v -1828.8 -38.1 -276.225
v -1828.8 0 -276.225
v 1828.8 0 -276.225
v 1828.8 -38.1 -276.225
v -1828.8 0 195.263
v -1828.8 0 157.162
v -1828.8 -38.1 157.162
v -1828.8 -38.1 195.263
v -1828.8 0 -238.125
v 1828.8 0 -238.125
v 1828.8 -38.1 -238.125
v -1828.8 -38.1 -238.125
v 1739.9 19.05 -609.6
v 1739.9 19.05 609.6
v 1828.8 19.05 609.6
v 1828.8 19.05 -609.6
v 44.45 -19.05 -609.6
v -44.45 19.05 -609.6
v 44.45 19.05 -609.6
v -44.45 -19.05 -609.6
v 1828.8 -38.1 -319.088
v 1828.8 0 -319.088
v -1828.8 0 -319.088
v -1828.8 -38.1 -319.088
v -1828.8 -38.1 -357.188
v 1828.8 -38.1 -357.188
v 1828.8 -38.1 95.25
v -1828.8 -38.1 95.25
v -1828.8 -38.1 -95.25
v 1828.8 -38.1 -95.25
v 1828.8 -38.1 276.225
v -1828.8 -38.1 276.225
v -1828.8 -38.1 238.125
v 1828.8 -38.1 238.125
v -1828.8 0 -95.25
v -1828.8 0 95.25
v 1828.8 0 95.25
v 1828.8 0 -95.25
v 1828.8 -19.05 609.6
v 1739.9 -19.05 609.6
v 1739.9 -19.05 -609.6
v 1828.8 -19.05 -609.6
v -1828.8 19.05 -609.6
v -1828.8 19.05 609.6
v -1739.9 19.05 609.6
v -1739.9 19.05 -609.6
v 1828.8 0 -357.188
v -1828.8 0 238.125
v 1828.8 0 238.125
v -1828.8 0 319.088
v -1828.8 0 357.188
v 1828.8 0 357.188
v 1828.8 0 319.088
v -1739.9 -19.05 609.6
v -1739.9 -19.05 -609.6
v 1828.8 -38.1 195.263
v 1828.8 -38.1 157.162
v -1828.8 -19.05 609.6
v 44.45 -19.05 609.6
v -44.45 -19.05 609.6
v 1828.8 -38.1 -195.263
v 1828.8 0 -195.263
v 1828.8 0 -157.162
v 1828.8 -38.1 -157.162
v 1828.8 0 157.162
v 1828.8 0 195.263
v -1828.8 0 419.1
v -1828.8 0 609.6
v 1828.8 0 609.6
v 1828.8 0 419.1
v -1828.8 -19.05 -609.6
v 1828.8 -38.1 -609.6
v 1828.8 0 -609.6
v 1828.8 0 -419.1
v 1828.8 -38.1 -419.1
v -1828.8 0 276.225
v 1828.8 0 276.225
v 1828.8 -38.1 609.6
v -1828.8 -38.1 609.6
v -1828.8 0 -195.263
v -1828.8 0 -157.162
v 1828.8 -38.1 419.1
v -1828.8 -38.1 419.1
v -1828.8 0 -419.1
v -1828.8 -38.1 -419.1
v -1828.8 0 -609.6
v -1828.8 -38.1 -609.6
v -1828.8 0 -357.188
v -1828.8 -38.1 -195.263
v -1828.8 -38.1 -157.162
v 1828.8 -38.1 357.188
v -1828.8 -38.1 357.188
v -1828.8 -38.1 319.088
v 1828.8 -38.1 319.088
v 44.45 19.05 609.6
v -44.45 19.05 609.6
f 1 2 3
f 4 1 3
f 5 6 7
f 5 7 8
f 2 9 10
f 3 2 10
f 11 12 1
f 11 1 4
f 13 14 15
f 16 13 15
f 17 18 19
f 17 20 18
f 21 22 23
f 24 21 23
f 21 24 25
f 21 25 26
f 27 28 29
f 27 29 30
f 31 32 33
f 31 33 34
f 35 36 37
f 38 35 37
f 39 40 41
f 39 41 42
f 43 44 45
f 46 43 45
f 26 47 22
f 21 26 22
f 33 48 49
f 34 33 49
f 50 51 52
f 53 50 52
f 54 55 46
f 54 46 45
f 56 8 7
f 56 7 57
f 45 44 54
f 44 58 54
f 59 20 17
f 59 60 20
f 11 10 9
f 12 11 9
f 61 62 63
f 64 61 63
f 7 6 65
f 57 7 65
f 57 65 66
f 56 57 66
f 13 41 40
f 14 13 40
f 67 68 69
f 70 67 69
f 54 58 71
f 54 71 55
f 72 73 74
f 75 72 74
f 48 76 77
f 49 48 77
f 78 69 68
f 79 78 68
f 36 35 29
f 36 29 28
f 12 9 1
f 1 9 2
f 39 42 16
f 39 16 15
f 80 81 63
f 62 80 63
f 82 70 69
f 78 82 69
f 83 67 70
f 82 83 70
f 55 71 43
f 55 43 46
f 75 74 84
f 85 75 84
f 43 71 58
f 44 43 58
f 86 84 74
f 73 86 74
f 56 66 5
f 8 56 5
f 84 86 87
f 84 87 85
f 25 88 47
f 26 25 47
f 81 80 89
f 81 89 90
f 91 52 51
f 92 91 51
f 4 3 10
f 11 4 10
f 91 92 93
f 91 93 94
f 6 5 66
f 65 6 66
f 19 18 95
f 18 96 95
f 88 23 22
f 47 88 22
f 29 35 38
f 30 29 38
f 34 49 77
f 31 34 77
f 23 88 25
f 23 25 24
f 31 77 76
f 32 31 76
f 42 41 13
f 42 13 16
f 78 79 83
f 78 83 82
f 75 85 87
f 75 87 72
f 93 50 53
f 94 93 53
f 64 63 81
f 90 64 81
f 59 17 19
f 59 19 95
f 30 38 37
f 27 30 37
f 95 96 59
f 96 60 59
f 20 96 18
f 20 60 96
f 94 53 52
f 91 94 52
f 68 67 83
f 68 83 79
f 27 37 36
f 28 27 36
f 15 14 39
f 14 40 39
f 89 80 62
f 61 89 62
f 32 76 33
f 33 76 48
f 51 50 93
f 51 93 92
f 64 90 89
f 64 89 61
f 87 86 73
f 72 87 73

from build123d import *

# Parameters (mm, degrees)
F0_W     = 1695.45
F0_H     = 190.5
F0_W_2   = 88.9
F1_DEPTH = 38.1
F0_H_2   = 38.1
F2_W     = 88.9
F2_H     = 1219.2
F3_DEPTH = 19.05
F2_H_2   = 514.35
F2_H_3   = 190.5


with BuildPart() as f1:
    # F0 (on Front) → F1 (new body)
    with BuildSketch(Plane.XZ):
        with Locations((-892.175, 514.35)):
            Rectangle(F0_W, F0_H)
        with Locations((0, 514.35)):
            Rectangle(F0_W_2, F0_H)
        with Locations((892.175, 514.35)):
            Rectangle(F0_W, F0_H)
        with Locations((1784.35, 514.35)):
            Rectangle(F0_W_2, F0_H)
        with Locations((-1784.35, 514.35)):
            Rectangle(F0_W_2, F0_H)
    extrude(amount=F1_DEPTH)


with BuildPart() as f1b:
    # F0 (on Front) → F1, piece 2 (new body)
    with BuildSketch(Plane.XZ):
        with Locations((-892.175, 0)):
            Rectangle(F0_W, F0_H)
        Rectangle(F0_W_2, F0_H)
        with Locations((892.175, 0)):
            Rectangle(F0_W, F0_H)
        with Locations((1784.35, 0)):
            Rectangle(F0_W_2, F0_H)
        with Locations((-1784.35, 0)):
            Rectangle(F0_W_2, F0_H)
    extrude(amount=F1_DEPTH)


with BuildPart() as f1c:
    # F0 (on Front) → F1, piece 3 (new body)
    with BuildSketch(Plane.XZ):
        with Locations((-1784.35, -338.1375)):
            Rectangle(F0_W_2, F0_H_2)
        with Locations((-892.175, -338.1375)):
            Rectangle(F0_W, F0_H_2)
        with Locations((892.175, -338.1375)):
            Rectangle(F0_W, F0_H_2)
        with Locations((0, -338.1375)):
            Rectangle(F0_W_2, F0_H_2)
        with Locations((1784.35, -338.1375)):
            Rectangle(F0_W_2, F0_H_2)
    extrude(amount=F1_DEPTH)


with BuildPart() as f1d:
    # F0 (on Front) → F1, piece 4 (new body)
    with BuildSketch(Plane.XZ):
        with Locations((1784.35, -514.35)):
            Rectangle(F0_W_2, F0_H)
        with Locations((892.175, -514.35)):
            Rectangle(F0_W, F0_H)
        with Locations((0, -514.35)):
            Rectangle(F0_W_2, F0_H)
        with Locations((-892.175, -514.35)):
            Rectangle(F0_W, F0_H)
        with Locations((-1784.35, -514.35)):
            Rectangle(F0_W_2, F0_H)
    extrude(amount=F1_DEPTH)


with BuildPart() as f1e:
    # F0 (on Front) → F1, piece 5 (new body)
    with BuildSketch(Plane.XZ):
        with Locations((-1784.35, 338.1375)):
            Rectangle(F0_W_2, F0_H_2)
        with Locations((-892.175, 338.1375)):
            Rectangle(F0_W, F0_H_2)
        with Locations((0, 338.1375)):
            Rectangle(F0_W_2, F0_H_2)
        with Locations((1784.35, 338.1375)):
            Rectangle(F0_W_2, F0_H_2)
        with Locations((892.175, 338.1375)):
            Rectangle(F0_W, F0_H_2)
    extrude(amount=F1_DEPTH)


with BuildPart() as f1f:
    # F0 (on Front) → F1, piece 6 (new body)
    with BuildSketch(Plane.XZ):
        with Locations((1784.35, 176.2125)):
            Rectangle(F0_W_2, F0_H_2)
        with Locations((892.175, 176.2125)):
            Rectangle(F0_W, F0_H_2)
        with Locations((0, 176.2125)):
            Rectangle(F0_W_2, F0_H_2)
        with Locations((-892.175, 176.2125)):
            Rectangle(F0_W, F0_H_2)
        with Locations((-1784.35, 176.2125)):
            Rectangle(F0_W_2, F0_H_2)
    extrude(amount=F1_DEPTH)


with BuildPart() as f1g:
    # F0 (on Front) → F1, piece 7 (new body)
    with BuildSketch(Plane.XZ):
        with Locations((-892.175, -176.2125)):
            Rectangle(F0_W, F0_H_2)
        with Locations((-1784.35, -176.2125)):
            Rectangle(F0_W_2, F0_H_2)
        with Locations((0, -176.2125)):
            Rectangle(F0_W_2, F0_H_2)
        with Locations((892.175, -176.2125)):
            Rectangle(F0_W, F0_H_2)
        with Locations((1784.35, -176.2125)):
            Rectangle(F0_W_2, F0_H_2)
    extrude(amount=F1_DEPTH)


with BuildPart() as f1h:
    # F0 (on Front) → F1, piece 8 (new body)
    with BuildSketch(Plane.XZ):
        with Locations((1784.35, -257.175)):
            Rectangle(F0_W_2, F0_H_2)
        with Locations((892.175, -257.175)):
            Rectangle(F0_W, F0_H_2)
        with Locations((0, -257.175)):
            Rectangle(F0_W_2, F0_H_2)
        with Locations((-892.175, -257.175)):
            Rectangle(F0_W, F0_H_2)
        Polygon((-1828.8, -276.225), (-1739.9, -276.225), (-1739.9, -238.125), (-1828.8, -238.125), (-1828.8, -257.175), align=None)
    extrude(amount=F1_DEPTH)


with BuildPart() as f1i:
    # F0 (on Front) → F1, piece 9 (new body)
    with BuildSketch(Plane.XZ):
        with Locations((1784.35, 257.175)):
            Rectangle(F0_W_2, F0_H_2)
        with Locations((892.175, 257.175)):
            Rectangle(F0_W, F0_H_2)
        with Locations((0, 257.175)):
            Rectangle(F0_W_2, F0_H_2)
        with Locations((-892.175, 257.175)):
            Rectangle(F0_W, F0_H_2)
        Polygon((-1828.8, 238.125), (-1739.9, 238.125), (-1739.9, 276.225), (-1828.8, 276.225), (-1828.8, 257.175), align=None)
    extrude(amount=F1_DEPTH)


with BuildPart() as f3:
    # F2 (on face) → F3 (new body, symmetric)
    with BuildSketch(Plane.XZ):
        with Locations((-1784.35, 0)):
            Rectangle(F2_W, F2_H)
    extrude(amount=F3_DEPTH, both=True)


with BuildPart() as f3b:
    # F2 (on face) → F3, piece 2 (new body, symmetric)
    with BuildSketch(Plane.XZ):
        with Locations((1784.35, 0)):
            Rectangle(F2_W, F2_H)
    extrude(amount=F3_DEPTH, both=True)


with BuildPart() as f3c:
    # F2 (on face) → F3, piece 3 (new body, symmetric)
    with BuildSketch(Plane.XZ):
        with Locations((0, -352.425)):
            Rectangle(F2_W, F2_H_2)
        with Locations((0, 352.425)):
            Rectangle(F2_W, F2_H_2)
        Rectangle(F2_W, F2_H_3)
    extrude(amount=F3_DEPTH, both=True)


solid = Compound([f1.part, f1b.part, f1c.part, f1d.part, f1e.part, f1f.part, f1g.part, f1h.part, f1i.part, f3.part, f3b.part, f3c.part])
